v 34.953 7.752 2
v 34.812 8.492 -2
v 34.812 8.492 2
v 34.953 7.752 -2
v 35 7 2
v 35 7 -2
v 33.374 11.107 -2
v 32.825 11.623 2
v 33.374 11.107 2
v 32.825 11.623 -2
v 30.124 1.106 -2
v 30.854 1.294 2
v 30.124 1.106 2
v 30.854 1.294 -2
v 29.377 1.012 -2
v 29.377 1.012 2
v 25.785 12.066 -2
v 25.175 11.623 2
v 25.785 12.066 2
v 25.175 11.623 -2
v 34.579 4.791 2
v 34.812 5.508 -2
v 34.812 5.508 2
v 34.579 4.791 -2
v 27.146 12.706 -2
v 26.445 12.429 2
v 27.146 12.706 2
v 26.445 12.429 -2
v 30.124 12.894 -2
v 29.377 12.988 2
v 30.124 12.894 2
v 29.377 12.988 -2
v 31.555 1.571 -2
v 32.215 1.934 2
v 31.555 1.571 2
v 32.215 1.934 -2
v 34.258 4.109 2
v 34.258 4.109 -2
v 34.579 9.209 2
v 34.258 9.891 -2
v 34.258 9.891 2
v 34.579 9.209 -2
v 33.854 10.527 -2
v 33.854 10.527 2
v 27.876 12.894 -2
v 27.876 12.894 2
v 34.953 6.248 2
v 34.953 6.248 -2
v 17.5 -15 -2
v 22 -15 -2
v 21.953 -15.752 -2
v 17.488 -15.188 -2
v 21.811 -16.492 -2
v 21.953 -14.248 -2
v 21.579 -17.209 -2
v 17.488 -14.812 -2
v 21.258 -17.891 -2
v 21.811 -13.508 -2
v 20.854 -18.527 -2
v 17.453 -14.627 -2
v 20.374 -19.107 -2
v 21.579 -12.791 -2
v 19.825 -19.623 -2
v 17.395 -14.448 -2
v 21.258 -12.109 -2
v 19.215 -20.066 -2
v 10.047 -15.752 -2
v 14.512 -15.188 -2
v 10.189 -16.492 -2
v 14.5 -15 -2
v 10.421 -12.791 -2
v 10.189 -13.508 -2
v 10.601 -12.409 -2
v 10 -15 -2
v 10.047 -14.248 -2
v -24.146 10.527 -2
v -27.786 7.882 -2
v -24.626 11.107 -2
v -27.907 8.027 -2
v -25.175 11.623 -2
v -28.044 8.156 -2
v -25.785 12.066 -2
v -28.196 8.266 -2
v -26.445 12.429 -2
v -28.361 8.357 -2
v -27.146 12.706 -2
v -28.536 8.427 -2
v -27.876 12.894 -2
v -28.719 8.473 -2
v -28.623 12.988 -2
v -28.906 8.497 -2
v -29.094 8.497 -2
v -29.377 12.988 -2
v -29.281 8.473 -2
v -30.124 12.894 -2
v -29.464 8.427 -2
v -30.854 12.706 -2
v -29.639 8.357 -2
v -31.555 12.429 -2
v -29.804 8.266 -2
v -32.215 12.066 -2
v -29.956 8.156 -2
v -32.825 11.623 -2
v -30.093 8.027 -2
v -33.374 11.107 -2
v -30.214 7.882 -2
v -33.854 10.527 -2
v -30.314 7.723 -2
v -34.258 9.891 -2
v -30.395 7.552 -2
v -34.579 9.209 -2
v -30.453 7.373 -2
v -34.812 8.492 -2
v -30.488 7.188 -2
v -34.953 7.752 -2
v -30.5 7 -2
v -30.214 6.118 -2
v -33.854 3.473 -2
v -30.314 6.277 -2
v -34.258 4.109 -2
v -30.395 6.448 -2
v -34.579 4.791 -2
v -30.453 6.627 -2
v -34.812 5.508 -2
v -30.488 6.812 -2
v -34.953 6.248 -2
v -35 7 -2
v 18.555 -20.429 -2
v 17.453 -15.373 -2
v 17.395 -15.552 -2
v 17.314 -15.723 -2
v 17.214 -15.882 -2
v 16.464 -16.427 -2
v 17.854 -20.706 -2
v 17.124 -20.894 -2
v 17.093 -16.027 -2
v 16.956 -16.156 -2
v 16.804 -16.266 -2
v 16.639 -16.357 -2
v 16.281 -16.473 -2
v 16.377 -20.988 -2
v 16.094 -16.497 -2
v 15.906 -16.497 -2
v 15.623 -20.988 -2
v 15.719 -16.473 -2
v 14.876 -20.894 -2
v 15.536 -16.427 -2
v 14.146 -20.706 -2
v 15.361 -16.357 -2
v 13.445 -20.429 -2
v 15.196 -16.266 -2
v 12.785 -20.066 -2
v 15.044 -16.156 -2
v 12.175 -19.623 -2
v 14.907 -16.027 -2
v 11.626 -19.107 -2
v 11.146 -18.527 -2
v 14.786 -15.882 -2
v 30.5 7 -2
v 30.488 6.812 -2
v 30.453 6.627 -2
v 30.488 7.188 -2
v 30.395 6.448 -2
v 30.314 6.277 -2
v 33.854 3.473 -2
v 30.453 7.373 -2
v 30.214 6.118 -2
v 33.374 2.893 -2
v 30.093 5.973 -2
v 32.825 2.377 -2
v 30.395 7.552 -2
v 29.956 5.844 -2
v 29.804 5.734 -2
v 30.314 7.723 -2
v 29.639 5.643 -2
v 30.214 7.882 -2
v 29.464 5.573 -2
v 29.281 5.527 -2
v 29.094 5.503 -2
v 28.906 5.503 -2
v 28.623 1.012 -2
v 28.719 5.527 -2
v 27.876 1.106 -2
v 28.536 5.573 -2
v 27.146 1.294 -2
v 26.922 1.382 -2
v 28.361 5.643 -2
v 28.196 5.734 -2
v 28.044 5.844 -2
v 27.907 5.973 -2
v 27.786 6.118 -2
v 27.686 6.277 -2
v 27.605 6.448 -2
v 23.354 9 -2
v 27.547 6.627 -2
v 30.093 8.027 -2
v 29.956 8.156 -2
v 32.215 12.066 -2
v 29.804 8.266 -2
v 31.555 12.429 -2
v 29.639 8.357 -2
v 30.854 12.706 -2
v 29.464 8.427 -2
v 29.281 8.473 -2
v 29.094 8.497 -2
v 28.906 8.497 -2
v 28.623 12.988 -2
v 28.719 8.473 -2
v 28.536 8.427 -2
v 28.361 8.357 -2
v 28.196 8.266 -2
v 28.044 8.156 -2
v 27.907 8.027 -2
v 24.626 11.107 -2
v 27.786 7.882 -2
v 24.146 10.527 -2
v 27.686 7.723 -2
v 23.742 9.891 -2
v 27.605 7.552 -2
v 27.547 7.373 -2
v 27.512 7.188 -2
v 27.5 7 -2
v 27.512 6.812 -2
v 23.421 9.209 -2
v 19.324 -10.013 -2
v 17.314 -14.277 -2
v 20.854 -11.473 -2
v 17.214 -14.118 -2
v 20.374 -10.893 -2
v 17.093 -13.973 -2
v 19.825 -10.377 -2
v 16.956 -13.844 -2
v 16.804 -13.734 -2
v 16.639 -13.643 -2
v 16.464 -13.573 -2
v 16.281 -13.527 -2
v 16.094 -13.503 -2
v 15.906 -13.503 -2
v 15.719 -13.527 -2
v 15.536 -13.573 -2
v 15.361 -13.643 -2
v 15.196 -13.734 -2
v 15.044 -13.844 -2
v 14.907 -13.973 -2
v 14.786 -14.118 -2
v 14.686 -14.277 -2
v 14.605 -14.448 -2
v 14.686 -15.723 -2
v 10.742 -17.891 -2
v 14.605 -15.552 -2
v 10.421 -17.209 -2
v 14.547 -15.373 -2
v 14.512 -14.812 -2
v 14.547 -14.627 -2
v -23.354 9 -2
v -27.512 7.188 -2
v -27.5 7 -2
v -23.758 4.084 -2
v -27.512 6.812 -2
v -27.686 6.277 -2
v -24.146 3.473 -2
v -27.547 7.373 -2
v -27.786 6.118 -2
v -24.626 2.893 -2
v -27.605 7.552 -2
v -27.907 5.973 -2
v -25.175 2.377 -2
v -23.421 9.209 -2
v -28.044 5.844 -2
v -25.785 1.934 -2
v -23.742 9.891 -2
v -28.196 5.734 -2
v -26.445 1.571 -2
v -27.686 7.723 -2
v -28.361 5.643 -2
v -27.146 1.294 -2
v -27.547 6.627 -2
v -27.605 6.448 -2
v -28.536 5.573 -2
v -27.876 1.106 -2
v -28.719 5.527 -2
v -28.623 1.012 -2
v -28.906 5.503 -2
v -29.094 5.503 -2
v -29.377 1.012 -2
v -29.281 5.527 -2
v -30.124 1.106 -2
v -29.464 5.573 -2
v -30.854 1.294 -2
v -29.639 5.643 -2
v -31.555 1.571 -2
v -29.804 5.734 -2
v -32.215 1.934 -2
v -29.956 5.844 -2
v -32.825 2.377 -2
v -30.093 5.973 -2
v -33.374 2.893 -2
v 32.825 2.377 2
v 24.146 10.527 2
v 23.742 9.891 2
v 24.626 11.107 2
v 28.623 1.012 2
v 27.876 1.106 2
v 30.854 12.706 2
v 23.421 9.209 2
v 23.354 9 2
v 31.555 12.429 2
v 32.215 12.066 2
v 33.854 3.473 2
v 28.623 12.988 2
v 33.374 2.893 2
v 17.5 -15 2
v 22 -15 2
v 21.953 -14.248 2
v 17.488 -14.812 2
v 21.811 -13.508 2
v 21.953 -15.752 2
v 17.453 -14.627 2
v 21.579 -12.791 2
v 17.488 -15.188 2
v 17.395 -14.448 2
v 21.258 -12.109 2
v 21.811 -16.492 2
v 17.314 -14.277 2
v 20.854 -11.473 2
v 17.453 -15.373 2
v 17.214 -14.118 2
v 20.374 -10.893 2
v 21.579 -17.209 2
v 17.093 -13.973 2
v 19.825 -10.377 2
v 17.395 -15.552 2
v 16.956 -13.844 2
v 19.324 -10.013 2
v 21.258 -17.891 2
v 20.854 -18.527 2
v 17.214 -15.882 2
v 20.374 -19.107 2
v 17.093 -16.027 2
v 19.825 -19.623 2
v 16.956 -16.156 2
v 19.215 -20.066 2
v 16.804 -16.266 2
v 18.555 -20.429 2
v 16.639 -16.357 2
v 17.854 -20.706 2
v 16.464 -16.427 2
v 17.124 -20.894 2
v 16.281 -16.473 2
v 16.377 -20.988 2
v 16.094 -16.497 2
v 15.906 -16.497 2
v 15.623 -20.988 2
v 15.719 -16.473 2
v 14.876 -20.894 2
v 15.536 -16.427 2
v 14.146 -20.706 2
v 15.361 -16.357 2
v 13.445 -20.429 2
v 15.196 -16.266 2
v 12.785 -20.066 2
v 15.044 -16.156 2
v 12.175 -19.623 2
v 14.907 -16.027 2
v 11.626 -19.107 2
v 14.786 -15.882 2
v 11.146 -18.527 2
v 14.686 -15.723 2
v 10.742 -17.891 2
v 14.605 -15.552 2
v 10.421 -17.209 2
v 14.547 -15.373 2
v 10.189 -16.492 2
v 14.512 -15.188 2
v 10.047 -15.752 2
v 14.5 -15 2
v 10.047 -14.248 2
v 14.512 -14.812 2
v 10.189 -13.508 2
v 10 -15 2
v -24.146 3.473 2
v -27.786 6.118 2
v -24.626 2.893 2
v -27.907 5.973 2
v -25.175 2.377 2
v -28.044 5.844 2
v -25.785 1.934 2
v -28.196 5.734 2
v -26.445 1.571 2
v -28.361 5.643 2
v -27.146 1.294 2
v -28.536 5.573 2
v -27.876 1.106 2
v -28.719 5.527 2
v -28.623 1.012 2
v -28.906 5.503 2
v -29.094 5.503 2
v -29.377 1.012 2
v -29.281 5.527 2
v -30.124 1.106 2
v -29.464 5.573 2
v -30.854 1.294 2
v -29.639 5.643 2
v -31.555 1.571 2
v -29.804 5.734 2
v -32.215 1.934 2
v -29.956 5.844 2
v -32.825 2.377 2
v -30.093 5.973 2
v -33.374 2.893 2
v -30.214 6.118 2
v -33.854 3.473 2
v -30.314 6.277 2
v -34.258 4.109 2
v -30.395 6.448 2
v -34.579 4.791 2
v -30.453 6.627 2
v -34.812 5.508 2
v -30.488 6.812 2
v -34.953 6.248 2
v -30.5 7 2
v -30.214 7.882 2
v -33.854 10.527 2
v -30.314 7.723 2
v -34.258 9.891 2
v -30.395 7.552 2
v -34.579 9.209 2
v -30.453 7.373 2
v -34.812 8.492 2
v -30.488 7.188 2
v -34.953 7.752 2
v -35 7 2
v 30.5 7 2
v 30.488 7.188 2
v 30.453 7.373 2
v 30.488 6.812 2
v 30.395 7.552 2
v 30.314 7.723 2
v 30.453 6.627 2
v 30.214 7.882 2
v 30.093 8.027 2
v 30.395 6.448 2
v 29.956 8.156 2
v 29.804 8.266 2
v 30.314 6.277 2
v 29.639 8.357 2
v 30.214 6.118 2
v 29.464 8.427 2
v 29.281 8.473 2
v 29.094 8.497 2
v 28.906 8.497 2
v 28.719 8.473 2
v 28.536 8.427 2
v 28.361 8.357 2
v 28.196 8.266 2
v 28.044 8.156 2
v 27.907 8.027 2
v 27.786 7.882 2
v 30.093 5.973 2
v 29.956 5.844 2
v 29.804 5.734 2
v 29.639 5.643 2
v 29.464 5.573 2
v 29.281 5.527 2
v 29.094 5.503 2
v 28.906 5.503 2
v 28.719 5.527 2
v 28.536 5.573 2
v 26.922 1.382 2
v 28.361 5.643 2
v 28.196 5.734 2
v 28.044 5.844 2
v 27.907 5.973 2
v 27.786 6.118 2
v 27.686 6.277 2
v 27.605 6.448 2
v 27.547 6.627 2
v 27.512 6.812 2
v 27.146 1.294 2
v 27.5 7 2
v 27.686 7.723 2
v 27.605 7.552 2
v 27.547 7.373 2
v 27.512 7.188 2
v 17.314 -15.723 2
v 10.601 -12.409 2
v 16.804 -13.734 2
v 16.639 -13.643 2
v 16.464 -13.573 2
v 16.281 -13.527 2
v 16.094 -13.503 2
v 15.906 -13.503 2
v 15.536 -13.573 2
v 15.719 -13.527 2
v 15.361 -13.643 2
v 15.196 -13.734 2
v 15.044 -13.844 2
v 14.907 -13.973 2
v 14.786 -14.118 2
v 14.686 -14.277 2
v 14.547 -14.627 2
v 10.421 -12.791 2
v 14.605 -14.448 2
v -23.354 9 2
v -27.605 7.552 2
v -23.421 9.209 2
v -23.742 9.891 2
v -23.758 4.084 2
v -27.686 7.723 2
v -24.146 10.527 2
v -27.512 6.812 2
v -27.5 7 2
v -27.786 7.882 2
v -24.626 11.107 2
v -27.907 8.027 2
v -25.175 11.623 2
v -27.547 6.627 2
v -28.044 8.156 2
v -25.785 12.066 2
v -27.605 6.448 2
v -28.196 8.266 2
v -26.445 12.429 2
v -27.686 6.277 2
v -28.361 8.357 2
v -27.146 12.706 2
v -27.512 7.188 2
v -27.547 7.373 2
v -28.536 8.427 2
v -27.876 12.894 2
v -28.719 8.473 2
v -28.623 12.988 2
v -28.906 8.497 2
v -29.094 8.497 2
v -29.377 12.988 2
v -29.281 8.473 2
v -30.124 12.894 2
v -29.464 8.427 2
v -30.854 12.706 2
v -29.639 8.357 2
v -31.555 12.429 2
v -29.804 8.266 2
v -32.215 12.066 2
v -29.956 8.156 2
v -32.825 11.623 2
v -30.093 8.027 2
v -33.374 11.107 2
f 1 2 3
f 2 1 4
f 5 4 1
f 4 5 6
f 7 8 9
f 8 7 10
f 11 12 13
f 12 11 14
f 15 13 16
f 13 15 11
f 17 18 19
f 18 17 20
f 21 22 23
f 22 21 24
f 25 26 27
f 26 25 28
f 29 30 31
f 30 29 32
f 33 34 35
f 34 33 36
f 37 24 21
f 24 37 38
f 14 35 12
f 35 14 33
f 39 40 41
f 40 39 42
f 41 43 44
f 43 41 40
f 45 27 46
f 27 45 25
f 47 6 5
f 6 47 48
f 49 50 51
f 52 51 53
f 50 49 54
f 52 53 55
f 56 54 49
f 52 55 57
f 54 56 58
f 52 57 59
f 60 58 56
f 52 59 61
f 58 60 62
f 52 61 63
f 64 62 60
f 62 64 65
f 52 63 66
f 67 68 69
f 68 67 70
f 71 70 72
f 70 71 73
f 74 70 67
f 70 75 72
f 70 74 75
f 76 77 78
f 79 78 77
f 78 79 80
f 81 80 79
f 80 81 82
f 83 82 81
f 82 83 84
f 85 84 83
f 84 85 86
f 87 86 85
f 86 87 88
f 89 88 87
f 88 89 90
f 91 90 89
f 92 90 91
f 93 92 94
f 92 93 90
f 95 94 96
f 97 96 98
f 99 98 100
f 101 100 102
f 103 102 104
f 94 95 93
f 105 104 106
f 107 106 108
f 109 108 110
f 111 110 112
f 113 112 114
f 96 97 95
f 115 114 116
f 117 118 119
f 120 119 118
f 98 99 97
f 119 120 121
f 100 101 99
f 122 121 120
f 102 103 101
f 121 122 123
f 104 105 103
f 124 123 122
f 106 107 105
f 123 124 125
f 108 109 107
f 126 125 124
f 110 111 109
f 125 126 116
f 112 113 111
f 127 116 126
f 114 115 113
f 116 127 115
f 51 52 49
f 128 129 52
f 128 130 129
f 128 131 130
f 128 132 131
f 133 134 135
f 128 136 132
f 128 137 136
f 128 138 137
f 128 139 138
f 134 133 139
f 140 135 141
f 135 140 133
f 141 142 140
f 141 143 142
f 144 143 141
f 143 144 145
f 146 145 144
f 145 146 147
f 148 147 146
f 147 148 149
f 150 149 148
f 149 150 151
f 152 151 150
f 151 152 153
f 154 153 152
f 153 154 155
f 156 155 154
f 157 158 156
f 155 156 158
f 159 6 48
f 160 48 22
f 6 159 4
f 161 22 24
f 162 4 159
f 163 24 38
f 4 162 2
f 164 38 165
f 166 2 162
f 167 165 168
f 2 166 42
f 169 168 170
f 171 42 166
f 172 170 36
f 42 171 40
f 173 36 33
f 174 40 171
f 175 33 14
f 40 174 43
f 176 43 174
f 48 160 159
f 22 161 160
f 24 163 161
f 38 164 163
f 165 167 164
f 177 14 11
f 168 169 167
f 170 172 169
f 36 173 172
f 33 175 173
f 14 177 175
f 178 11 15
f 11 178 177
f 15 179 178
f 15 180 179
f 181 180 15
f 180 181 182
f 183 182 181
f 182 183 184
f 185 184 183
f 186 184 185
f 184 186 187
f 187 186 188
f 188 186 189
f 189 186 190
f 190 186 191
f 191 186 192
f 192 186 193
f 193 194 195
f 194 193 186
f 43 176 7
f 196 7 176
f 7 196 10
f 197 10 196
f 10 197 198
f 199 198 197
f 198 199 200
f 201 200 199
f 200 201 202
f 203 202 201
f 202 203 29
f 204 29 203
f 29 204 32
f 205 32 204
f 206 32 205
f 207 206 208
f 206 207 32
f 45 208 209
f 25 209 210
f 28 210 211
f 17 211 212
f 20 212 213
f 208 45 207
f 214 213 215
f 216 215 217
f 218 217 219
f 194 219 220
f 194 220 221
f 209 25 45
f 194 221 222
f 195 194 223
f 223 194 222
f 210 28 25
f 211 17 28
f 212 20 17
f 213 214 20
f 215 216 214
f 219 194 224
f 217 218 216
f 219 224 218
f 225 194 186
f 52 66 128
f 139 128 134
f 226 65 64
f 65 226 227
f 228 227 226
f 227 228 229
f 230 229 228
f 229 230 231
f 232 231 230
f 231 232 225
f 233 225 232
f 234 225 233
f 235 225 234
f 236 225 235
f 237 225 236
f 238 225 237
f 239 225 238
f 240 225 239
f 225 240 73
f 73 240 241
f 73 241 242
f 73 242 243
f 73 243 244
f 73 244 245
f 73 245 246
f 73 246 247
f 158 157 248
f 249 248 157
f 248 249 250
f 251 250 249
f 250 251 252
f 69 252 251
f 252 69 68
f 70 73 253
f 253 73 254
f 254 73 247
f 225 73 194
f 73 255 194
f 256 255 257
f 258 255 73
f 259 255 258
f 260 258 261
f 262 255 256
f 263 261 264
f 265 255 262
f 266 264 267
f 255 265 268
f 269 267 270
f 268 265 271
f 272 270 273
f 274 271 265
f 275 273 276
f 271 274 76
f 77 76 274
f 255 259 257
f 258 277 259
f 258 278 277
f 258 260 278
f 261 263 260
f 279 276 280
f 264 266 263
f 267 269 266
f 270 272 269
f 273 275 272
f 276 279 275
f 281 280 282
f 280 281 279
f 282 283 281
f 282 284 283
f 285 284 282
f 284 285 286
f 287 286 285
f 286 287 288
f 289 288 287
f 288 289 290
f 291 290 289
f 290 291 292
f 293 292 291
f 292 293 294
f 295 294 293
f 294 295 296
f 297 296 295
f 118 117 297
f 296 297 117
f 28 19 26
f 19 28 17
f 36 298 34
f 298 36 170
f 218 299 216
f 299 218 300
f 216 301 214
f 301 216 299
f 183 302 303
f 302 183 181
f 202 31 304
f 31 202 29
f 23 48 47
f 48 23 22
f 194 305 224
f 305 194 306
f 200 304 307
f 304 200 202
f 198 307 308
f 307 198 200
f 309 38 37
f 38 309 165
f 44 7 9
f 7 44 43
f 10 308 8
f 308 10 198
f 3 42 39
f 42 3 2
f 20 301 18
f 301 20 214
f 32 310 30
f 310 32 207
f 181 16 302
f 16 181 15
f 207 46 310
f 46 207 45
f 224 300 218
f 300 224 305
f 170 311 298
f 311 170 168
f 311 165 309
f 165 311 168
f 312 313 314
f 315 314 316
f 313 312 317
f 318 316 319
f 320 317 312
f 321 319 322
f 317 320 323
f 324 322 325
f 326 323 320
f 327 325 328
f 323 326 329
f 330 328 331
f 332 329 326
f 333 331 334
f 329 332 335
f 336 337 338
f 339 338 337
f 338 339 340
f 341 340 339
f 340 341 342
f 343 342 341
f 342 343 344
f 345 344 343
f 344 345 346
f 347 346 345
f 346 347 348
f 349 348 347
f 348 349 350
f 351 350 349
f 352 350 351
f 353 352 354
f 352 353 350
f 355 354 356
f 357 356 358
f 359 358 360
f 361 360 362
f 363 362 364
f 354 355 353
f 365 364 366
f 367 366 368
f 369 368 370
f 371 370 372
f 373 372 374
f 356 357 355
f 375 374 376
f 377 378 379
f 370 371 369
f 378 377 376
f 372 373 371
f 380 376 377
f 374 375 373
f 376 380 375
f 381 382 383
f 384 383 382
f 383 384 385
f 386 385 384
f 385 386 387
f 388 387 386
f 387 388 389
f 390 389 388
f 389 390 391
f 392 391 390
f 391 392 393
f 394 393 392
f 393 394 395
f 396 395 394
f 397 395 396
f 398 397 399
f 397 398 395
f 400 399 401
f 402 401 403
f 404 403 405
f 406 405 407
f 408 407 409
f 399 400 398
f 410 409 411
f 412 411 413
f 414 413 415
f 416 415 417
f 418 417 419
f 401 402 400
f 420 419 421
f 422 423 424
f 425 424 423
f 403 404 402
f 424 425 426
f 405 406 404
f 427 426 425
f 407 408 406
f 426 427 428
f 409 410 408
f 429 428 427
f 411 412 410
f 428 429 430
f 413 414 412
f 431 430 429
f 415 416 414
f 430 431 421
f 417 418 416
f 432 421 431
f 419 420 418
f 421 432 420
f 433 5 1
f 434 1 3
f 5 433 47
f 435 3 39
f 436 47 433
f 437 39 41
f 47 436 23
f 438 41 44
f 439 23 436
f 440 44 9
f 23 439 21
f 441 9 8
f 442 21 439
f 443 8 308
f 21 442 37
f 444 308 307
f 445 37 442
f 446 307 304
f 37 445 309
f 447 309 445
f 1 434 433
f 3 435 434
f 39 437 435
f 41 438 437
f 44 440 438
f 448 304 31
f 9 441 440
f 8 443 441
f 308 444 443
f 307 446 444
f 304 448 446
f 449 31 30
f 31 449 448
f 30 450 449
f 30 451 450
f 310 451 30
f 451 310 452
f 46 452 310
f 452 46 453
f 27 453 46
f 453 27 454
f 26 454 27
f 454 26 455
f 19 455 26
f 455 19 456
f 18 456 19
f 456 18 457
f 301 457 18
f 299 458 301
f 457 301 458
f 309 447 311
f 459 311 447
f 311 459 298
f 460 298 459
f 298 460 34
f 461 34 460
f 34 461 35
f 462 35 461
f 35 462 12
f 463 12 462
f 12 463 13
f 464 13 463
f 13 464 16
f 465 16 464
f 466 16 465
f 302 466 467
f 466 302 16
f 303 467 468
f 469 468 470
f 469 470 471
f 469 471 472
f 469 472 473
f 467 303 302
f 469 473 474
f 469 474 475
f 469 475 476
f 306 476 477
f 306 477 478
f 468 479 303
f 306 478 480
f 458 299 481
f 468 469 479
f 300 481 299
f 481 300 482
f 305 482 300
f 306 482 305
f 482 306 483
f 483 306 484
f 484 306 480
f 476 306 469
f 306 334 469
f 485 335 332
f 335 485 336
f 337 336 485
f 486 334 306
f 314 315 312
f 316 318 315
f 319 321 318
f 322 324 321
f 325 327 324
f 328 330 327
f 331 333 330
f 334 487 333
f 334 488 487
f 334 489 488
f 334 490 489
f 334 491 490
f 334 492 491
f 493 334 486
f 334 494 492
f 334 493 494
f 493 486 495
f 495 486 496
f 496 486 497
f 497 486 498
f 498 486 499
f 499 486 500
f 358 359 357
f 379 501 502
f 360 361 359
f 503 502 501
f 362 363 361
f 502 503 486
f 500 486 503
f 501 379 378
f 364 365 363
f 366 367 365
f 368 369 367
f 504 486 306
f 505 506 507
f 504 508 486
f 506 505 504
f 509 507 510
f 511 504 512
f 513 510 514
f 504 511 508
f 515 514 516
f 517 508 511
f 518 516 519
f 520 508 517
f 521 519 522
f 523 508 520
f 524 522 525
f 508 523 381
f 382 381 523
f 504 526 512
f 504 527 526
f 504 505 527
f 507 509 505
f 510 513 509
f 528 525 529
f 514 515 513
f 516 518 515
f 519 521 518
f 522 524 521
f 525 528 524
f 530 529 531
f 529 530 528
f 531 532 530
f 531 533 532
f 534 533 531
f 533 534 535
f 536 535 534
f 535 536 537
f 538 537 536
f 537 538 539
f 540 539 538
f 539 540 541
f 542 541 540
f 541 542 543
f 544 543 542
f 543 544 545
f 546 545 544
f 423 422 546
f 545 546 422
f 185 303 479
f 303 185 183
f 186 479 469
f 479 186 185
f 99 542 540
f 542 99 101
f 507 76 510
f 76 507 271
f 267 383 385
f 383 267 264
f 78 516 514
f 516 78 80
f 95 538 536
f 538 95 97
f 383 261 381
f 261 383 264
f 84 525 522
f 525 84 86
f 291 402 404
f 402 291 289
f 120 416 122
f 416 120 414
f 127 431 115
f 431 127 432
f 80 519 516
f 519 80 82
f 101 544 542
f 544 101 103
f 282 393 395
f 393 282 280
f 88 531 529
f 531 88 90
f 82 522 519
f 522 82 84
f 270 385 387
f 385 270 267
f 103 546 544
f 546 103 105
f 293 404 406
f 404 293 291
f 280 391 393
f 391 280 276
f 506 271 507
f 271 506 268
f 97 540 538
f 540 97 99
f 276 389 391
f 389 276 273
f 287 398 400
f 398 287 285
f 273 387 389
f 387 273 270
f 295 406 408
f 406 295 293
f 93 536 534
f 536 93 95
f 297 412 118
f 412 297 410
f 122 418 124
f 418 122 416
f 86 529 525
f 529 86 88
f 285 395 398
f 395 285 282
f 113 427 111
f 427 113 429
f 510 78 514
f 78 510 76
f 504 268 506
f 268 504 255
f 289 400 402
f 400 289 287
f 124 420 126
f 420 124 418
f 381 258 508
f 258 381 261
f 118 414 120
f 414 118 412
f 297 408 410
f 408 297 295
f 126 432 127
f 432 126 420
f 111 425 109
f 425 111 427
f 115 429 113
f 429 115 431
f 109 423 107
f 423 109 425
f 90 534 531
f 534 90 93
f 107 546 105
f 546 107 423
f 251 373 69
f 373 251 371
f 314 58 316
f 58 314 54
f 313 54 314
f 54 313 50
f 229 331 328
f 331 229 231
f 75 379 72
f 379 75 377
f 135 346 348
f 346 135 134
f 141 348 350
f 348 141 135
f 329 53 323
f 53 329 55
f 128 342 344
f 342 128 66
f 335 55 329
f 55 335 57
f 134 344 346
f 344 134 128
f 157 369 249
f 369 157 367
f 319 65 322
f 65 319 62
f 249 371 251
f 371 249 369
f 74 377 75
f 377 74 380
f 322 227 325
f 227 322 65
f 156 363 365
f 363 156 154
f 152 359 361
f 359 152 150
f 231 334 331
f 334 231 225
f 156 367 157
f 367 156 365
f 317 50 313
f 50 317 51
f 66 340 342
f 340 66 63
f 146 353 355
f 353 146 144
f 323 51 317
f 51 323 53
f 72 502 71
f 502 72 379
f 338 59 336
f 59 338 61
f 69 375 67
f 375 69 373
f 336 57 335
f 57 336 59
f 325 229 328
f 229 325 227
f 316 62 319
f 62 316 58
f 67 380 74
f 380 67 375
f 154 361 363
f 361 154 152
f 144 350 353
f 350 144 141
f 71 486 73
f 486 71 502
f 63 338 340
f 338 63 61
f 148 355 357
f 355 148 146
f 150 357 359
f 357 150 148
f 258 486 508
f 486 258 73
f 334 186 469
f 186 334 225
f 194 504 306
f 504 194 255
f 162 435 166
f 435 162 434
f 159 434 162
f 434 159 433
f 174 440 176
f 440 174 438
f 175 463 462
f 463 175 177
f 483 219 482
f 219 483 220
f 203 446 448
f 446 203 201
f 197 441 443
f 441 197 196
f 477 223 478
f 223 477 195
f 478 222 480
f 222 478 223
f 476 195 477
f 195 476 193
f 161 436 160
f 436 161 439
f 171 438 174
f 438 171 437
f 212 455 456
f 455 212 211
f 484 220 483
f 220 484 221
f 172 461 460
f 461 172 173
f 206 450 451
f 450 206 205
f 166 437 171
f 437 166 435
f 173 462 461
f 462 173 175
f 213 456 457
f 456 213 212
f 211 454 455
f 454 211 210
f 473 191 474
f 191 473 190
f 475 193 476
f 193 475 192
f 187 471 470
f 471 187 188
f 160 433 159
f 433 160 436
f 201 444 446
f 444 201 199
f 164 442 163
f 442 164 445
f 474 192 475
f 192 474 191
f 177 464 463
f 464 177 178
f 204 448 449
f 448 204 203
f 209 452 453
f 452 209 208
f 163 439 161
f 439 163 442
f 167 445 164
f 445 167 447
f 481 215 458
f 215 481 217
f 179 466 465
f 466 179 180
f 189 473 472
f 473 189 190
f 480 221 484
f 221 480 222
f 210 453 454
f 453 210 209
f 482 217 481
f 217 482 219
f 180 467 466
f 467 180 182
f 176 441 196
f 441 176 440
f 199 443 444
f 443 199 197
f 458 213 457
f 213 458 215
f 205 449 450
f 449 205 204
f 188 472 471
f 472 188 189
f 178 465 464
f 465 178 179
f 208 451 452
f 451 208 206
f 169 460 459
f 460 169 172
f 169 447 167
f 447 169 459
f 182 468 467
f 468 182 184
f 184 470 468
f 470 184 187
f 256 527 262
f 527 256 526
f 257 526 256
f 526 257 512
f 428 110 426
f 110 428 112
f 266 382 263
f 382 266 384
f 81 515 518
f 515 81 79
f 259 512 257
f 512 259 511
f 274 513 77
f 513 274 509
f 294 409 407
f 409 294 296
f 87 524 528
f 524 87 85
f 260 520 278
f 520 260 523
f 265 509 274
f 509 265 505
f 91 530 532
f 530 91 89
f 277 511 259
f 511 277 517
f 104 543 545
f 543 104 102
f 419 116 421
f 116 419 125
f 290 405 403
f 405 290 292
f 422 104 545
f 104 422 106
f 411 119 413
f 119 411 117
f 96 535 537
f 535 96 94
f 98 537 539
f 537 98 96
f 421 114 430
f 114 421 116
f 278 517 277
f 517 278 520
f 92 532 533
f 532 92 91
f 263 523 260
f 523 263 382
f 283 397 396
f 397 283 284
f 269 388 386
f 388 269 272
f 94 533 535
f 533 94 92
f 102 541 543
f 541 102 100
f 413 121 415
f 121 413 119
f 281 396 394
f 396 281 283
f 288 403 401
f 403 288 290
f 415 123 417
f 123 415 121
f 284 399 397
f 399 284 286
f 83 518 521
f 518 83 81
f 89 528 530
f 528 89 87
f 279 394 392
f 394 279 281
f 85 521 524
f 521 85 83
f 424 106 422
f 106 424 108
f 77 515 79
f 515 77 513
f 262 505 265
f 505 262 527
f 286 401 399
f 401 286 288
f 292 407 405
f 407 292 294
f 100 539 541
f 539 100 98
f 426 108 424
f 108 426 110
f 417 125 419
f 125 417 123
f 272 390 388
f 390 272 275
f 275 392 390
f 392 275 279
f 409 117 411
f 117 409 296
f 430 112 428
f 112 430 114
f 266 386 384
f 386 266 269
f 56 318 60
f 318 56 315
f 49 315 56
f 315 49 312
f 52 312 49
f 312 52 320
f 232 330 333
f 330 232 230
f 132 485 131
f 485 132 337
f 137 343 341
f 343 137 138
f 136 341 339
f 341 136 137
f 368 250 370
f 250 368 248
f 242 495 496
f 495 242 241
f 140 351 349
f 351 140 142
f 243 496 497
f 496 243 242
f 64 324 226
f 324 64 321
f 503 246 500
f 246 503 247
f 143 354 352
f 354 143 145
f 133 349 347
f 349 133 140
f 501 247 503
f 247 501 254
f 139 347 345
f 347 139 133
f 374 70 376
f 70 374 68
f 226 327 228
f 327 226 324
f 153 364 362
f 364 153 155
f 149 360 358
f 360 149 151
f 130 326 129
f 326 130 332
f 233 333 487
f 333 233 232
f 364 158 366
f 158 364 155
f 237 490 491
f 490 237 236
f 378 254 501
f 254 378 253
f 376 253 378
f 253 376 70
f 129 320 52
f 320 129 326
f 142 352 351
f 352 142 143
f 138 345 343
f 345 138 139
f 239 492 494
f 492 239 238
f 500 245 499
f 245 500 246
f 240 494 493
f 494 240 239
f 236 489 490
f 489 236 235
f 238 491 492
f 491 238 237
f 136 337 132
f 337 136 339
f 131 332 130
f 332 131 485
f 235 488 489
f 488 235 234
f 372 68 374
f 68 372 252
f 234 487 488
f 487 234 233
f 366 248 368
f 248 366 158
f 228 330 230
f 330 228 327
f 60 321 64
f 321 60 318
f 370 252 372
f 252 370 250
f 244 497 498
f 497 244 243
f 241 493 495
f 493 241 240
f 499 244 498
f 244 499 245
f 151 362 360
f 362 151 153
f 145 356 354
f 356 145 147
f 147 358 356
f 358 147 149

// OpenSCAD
//Author: Piotr Paterek, Kraków 05-08.2016
$fn=50;
module fourangle()
{
    translate([29, 7, 0])
    {
        cylinder(r=6, h=4, center=true);
    }
    translate([-29, 7, 0])
    {
        cylinder(r=6, h=4, center=true);
    }
    translate([16,-15, 0])
    {
        cylinder(r=6, h=4, center=true);
    }
    translate([0,0,-2])
    {
        linear_extrude(height=4, convexity = 10){
        polygon(points=[[32,9],[-34,9],[16,-15]]);
        }
    }
}
//holes
difference()
{
    difference()
{
    difference()
{
    fourangle();
    translate([29, 7, 0])
    {
        cylinder(r=1.5, h=4, center=true);
    }
    translate([-29, 7, 0])
    {
        cylinder(r=1.5, h=4, center=true);
    }
    translate([16,-15, 0])
    {
        cylinder(r=1.5, h=4, center=true);
    }
}
}
}
